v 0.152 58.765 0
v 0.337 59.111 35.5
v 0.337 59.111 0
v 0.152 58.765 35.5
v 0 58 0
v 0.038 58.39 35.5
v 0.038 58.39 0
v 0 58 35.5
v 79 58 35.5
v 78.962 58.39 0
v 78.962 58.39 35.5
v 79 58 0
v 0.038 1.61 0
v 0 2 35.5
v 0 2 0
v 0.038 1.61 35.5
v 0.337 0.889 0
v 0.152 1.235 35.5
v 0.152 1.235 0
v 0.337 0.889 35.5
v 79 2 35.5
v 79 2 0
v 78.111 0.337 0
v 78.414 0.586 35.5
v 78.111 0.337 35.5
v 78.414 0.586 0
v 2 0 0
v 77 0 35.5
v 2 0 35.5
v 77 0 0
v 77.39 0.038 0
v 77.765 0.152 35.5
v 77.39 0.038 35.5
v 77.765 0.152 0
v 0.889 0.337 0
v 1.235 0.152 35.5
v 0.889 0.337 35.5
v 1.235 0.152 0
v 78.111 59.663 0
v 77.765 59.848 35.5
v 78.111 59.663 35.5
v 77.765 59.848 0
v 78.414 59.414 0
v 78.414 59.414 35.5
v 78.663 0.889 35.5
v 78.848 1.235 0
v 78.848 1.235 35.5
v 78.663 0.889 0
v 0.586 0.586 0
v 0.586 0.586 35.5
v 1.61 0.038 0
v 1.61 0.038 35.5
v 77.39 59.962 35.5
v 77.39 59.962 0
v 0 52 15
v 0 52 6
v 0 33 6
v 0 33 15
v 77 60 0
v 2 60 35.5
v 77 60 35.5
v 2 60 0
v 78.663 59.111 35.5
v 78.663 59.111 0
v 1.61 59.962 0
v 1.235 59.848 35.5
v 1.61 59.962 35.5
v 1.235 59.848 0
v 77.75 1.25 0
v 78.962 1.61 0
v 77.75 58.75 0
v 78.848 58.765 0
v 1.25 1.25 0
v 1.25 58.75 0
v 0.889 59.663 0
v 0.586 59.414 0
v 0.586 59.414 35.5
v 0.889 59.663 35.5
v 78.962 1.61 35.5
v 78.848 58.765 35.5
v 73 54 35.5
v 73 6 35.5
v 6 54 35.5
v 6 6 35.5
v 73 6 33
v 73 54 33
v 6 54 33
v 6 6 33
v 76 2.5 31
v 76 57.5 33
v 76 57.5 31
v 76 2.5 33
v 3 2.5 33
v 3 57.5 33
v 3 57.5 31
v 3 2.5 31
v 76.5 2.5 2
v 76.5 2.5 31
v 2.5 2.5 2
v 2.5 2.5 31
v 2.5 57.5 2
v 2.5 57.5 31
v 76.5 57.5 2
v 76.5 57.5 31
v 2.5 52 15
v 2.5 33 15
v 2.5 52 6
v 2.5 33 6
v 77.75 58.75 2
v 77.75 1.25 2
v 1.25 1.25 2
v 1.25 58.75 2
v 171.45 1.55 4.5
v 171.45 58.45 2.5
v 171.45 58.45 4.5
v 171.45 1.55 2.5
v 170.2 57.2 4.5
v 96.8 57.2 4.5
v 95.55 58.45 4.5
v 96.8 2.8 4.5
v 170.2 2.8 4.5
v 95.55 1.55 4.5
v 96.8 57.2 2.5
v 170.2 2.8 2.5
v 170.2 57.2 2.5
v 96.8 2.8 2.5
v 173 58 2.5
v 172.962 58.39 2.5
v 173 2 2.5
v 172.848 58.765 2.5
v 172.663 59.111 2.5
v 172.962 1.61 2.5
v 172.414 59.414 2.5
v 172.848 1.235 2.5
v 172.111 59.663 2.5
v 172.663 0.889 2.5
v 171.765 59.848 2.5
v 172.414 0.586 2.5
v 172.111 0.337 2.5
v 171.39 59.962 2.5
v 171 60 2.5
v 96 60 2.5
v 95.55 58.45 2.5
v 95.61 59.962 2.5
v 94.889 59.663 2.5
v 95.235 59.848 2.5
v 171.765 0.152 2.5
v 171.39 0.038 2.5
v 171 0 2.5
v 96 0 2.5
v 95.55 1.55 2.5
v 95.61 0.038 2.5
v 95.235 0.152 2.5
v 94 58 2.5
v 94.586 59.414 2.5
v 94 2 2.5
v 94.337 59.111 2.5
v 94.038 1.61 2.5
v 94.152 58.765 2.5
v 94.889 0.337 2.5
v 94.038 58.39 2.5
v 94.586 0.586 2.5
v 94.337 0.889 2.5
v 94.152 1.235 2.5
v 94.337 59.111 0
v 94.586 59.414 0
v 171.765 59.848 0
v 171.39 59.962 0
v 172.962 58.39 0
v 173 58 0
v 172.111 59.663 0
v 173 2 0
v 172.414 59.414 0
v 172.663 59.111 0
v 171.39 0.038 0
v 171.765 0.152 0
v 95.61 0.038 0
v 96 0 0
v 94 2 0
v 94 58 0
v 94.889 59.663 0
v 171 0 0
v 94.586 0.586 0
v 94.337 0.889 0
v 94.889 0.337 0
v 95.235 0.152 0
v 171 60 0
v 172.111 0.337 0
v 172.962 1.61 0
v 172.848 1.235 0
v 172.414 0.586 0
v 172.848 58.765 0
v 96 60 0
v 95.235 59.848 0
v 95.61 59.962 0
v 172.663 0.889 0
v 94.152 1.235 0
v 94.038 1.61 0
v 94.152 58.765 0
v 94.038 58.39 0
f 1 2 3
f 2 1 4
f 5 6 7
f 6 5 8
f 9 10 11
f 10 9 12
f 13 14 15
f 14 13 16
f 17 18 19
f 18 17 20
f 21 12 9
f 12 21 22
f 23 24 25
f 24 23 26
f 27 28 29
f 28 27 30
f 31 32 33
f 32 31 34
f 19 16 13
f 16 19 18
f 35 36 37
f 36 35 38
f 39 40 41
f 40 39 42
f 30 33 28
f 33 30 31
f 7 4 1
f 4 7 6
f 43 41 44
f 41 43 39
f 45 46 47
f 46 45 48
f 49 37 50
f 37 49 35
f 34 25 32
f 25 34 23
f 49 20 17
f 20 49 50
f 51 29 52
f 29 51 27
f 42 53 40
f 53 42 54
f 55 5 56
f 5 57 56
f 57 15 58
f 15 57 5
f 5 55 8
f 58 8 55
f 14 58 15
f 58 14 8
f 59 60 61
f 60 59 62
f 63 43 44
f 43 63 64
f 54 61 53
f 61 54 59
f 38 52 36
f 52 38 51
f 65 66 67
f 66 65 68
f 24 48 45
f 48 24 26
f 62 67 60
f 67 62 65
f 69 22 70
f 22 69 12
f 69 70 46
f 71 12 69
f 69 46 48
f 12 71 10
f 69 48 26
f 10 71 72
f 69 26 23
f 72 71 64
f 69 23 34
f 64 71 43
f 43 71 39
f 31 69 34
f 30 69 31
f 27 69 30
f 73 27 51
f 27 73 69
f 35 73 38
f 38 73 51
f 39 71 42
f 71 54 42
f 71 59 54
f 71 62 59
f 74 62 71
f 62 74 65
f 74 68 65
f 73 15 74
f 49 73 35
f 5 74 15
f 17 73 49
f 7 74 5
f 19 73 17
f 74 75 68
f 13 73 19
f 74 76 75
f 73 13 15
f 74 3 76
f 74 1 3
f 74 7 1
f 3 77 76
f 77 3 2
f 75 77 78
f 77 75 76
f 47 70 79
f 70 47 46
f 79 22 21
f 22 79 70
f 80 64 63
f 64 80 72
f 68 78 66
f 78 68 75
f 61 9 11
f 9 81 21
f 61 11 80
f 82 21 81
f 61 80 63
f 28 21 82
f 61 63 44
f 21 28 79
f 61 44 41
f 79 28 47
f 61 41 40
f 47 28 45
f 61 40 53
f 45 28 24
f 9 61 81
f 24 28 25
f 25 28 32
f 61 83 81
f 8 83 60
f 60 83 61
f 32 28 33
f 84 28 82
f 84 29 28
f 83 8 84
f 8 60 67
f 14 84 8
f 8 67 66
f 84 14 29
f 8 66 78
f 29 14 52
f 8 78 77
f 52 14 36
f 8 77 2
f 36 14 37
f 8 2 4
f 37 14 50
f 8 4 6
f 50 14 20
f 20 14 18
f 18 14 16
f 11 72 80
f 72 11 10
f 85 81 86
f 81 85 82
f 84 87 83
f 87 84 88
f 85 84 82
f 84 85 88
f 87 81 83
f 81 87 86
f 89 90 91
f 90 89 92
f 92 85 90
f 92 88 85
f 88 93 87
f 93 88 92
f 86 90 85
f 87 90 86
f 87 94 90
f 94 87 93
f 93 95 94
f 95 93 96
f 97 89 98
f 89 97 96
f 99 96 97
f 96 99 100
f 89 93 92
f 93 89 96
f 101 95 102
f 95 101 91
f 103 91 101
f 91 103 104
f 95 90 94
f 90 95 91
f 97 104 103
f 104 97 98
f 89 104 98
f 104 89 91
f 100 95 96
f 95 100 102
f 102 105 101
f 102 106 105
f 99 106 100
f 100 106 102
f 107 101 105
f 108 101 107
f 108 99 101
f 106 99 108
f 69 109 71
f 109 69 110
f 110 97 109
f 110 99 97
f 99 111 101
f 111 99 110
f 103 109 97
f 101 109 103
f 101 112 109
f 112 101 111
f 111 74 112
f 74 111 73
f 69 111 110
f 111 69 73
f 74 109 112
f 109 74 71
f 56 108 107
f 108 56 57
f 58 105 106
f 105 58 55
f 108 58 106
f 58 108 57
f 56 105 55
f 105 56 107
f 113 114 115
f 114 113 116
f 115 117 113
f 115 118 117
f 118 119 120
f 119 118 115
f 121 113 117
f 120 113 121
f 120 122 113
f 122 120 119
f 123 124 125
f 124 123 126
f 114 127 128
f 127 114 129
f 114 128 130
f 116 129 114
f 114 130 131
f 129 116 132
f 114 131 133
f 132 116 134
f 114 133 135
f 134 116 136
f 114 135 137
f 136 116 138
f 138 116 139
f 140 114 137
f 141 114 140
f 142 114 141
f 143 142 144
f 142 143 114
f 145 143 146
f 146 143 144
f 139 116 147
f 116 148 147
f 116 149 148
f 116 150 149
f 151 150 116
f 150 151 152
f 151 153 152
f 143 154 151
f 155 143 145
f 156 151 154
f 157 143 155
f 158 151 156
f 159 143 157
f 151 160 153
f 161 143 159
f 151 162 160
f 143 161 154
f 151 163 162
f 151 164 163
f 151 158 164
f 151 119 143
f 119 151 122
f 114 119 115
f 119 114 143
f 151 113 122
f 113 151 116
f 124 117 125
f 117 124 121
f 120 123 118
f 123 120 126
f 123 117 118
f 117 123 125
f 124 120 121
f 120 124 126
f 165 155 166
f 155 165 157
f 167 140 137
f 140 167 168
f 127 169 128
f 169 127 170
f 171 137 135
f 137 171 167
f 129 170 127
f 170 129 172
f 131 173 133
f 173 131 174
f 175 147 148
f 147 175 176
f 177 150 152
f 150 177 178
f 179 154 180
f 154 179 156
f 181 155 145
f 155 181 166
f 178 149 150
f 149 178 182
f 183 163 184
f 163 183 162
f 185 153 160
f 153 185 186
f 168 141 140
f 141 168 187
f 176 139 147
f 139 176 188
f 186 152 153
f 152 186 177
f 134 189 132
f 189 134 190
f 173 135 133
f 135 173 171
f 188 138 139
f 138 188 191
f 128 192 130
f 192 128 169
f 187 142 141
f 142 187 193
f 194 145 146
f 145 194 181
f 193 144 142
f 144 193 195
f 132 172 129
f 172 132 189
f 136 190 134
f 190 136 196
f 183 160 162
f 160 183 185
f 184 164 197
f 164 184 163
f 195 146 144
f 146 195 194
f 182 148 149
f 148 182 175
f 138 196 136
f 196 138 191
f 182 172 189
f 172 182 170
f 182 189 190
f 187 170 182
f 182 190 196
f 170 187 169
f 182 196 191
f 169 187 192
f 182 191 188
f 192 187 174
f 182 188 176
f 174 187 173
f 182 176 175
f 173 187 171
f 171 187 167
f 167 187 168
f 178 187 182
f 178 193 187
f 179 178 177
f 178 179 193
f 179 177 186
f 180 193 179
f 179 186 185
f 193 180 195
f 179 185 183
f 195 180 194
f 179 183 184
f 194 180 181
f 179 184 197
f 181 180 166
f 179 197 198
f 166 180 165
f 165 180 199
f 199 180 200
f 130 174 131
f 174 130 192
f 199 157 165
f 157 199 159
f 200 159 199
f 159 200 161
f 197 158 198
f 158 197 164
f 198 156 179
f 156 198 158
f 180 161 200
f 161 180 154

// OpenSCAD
// =============================================================================
// AIR QUALITY RECEIVER - ENCLOSURE v3.0
// =============================================================================
// Obudowa do druku 3D - KLEJONA (2 czesci)
// 
// Drukarka: Creality Ender-3 Pro
// Filament: Devil Design PLA 1.75mm Black
// Tolerancja druku FDM: +/- 0.3mm
//
// Data: 2026-01-05
// Wersja: 3.0 (klejona obudowa, ramka zintegrowana z korpusem)
// =============================================================================
//
// KONSTRUKCJA:
// - Czesc 1: Korpus z ramka LCD (case_body_v3)
// - Czesc 2: Tylna pokrywa/dekiel (case_cover_v3)
// - Laczenie: klej na goraco (latwe otwarcie w przyszlosci)
//
// DRUK (bez supportow!):
// - Korpus: ramka LCD na stole, sciany rosna do gory
// - Pokrywa: plyta na stole, ramka 2mm rosnie do gory
// =============================================================================

// === WYMIARY ZEWNETRZNE ===
width = 79;       // szerokosc (X)
height = 60;      // wysokosc (Y)
depth = 38;       // glebokosc (Z) calkowita

// === SCIANKA ===
wall = 2.5;       // grubosc scianki

// === WYMIARY WEWNETRZNE ===
// Szerokosc wewn: 79 - 2*2.5 = 74 mm
// Wysokosc wewn: 60 - 2*2.5 = 55 mm
// Glebokosc wewn: 38 - 2.5 (ramka) - 2.5 (dekiel) = 33 mm (32 elektronika + 1 luz)

// === LCD ===
lcd_visible_w = 67;    // otwor widoczny LCD
lcd_visible_h = 48;    // otwor widoczny LCD
lcd_shelf_w = 73;      // polka na PCB
lcd_shelf_h = 55;      // polka na PCB
lcd_glass = 2.0;       // glebokosc uskoku na panel LCD

// === USB-C (lewa scianka, gora, kabel do tylu) ===
usb_w = 19;            // szerokosc otworu wzdluz Y (bylo 14, +5mm)
usb_h = 9;             // glebokosc otworu wzdluz Z
usb_from_top = 8;      // od gornej krawedzi
usb_from_back = 6;     // od tylnej krawedzi

// === POLACZENIE KORPUS-POKRYWA ===
edge_thin = wall / 2;  // 1.25mm - ciensza krawedz tylna korpusu
cover_lip = 2.0;       // wysokosc ramki pokrywy wchodzacej w korpus
cover_lip_thick = wall / 2;  // 1.25mm - grubosc ramki pokrywy
tol = 0.3;             // tolerancja dopasowania

// === ZAOKRAGLENIE ===
r = 2;

// === RENDER MODE ===
// Uzyj: openscad -D 'part="body"' -o case_body_v3.stl air_quality_case_v3.scad
part = "both";  // "body", "cover", "both"

$fn = 32;

// =============================================================================
// KORPUS Z RAMKA LCD (case_body_v3)
// =============================================================================
// Drukowany ramka LCD na stole (Z=0), sciany rosna do gory
// Krawedz tylna ciensza (edge_thin) - miejsce na ramke pokrywy

module body_v3() {
    // Glebokosc korpusu (bez dekla)
    body_depth = depth - wall;  // 38 - 2.5 = 35.5mm
    
    difference() {
        // Zewnetrzna bryla z zaokragleniami
        hull() {
            translate([r, r, 0]) cylinder(r=r, h=body_depth);
            translate([width-r, r, 0]) cylinder(r=r, h=body_depth);
            translate([r, height-r, 0]) cylinder(r=r, h=body_depth);
            translate([width-r, height-r, 0]) cylinder(r=r, h=body_depth);
        }
        
        // Otwor widoczny na LCD (na froncie, Z=0)
        translate([(width - lcd_visible_w)/2, (height - lcd_visible_h)/2, -1])
            cube([lcd_visible_w, lcd_visible_h, wall + 2]);
        
        // Polka/uskok na PCB LCD
        translate([(width - lcd_shelf_w)/2, (height - lcd_shelf_h)/2, wall])
            cube([lcd_shelf_w, lcd_shelf_h, lcd_glass + 1]);
        
        // Wnetrze - wyciecie na elektronike
        // Zaczyna sie od wall + lcd_glass, konczy przed edge_thin
        translate([wall, wall, wall + lcd_glass])
            cube([width - 2*wall, height - 2*wall, body_depth - wall - lcd_glass - edge_thin]);
        
        // Poszerzenie na ramke pokrywy (ciensza krawedz)
        // Na gorze korpusu, glebokosc cover_lip, scianka edge_thin
        translate([edge_thin, edge_thin, body_depth - cover_lip])
            cube([width - 2*edge_thin, height - 2*edge_thin, cover_lip + 1]);
        
        // Otwor USB-C na LEWEJ sciance, NA GORZE (patrzac na LCD od frontu)
        // Po odwroceniu do druku (ramka na stole), USB bedzie na gorze
        // usb_from_top - po obrocie 180 wokol X bedzie na gorze Y
        translate([-1, usb_from_top, body_depth - usb_from_back - usb_h])
            cube([wall + 2, usb_w, usb_h]);
    }
}

// Korpus obrocony do druku (ramka LCD na stole)
module body_v3_print() {
    translate([0, height, depth - wall])
        rotate([180, 0, 0])
            body_v3();
}

// =============================================================================
// TYLNA POKRYWA / DEKIEL (case_cover_v3)
// =============================================================================
// Drukowana plyta na stole (Z=0), ramka rosnie do gory

module cover_v3() {
    difference() {
        union() {
            // Glowna plyta pokrywy
            hull() {
                translate([r, r, 0]) cylinder(r=r, h=wall);
                translate([width-r, r, 0]) cylinder(r=r, h=wall);
                translate([r, height-r, 0]) cylinder(r=r, h=wall);
                translate([width-r, height-r, 0]) cylinder(r=r, h=wall);
            }
            
            // Ramka wchodzaca w korpus
            translate([edge_thin + tol, edge_thin + tol, wall])
                difference() {
                    cube([width - 2*edge_thin - 2*tol, height - 2*edge_thin - 2*tol, cover_lip]);
                    translate([cover_lip_thick, cover_lip_thick, -1])
                        cube([width - 2*edge_thin - 2*tol - 2*cover_lip_thick, 
                              height - 2*edge_thin - 2*tol - 2*cover_lip_thick, 
                              cover_lip + 2]);
                }
        }
    }
}

// =============================================================================
// RENDEROWANIE
// =============================================================================
if (part == "body") {
    body_v3_print();
} else if (part == "cover") {
    cover_v3();
} else if (part == "both") {
    // Podglad obu czesci obok siebie
    color("DimGray") body_v3_print();
    color("Gray") translate([width + 15, 0, 0]) cover_v3();
}

// =============================================================================
// INFO
// =============================================================================
echo(str(""));
echo(str("=== AIR QUALITY ENCLOSURE v3.0 ==="));
echo(str(""));
echo(str("WYMIARY ZEWNETRZNE: ", width, " x ", height, " x ", depth, " mm"));
echo(str("WYMIARY WEWNETRZNE: ", width - 2*wall, " x ", height - 2*wall, " x ", depth - 2*wall, " mm"));
echo(str(""));
echo(str("LCD OTWOR: ", lcd_visible_w, " x ", lcd_visible_h, " mm"));
echo(str("LCD POLKA: ", lcd_shelf_w, " x ", lcd_shelf_h, " mm"));
echo(str(""));
echo(str("USB-C: ", usb_w, " x ", usb_h, " mm (lewa scianka, gora)"));
echo(str(""));
echo(str("KONSTRUKCJA KLEJENA:"));
echo(str("  Korpus: ramka LCD + sciany (krawedz tylna ", edge_thin, "mm)"));
echo(str("  Pokrywa: plyta ", wall, "mm + ramka ", cover_lip_thick, "x", cover_lip, "mm"));
echo(str(""));
